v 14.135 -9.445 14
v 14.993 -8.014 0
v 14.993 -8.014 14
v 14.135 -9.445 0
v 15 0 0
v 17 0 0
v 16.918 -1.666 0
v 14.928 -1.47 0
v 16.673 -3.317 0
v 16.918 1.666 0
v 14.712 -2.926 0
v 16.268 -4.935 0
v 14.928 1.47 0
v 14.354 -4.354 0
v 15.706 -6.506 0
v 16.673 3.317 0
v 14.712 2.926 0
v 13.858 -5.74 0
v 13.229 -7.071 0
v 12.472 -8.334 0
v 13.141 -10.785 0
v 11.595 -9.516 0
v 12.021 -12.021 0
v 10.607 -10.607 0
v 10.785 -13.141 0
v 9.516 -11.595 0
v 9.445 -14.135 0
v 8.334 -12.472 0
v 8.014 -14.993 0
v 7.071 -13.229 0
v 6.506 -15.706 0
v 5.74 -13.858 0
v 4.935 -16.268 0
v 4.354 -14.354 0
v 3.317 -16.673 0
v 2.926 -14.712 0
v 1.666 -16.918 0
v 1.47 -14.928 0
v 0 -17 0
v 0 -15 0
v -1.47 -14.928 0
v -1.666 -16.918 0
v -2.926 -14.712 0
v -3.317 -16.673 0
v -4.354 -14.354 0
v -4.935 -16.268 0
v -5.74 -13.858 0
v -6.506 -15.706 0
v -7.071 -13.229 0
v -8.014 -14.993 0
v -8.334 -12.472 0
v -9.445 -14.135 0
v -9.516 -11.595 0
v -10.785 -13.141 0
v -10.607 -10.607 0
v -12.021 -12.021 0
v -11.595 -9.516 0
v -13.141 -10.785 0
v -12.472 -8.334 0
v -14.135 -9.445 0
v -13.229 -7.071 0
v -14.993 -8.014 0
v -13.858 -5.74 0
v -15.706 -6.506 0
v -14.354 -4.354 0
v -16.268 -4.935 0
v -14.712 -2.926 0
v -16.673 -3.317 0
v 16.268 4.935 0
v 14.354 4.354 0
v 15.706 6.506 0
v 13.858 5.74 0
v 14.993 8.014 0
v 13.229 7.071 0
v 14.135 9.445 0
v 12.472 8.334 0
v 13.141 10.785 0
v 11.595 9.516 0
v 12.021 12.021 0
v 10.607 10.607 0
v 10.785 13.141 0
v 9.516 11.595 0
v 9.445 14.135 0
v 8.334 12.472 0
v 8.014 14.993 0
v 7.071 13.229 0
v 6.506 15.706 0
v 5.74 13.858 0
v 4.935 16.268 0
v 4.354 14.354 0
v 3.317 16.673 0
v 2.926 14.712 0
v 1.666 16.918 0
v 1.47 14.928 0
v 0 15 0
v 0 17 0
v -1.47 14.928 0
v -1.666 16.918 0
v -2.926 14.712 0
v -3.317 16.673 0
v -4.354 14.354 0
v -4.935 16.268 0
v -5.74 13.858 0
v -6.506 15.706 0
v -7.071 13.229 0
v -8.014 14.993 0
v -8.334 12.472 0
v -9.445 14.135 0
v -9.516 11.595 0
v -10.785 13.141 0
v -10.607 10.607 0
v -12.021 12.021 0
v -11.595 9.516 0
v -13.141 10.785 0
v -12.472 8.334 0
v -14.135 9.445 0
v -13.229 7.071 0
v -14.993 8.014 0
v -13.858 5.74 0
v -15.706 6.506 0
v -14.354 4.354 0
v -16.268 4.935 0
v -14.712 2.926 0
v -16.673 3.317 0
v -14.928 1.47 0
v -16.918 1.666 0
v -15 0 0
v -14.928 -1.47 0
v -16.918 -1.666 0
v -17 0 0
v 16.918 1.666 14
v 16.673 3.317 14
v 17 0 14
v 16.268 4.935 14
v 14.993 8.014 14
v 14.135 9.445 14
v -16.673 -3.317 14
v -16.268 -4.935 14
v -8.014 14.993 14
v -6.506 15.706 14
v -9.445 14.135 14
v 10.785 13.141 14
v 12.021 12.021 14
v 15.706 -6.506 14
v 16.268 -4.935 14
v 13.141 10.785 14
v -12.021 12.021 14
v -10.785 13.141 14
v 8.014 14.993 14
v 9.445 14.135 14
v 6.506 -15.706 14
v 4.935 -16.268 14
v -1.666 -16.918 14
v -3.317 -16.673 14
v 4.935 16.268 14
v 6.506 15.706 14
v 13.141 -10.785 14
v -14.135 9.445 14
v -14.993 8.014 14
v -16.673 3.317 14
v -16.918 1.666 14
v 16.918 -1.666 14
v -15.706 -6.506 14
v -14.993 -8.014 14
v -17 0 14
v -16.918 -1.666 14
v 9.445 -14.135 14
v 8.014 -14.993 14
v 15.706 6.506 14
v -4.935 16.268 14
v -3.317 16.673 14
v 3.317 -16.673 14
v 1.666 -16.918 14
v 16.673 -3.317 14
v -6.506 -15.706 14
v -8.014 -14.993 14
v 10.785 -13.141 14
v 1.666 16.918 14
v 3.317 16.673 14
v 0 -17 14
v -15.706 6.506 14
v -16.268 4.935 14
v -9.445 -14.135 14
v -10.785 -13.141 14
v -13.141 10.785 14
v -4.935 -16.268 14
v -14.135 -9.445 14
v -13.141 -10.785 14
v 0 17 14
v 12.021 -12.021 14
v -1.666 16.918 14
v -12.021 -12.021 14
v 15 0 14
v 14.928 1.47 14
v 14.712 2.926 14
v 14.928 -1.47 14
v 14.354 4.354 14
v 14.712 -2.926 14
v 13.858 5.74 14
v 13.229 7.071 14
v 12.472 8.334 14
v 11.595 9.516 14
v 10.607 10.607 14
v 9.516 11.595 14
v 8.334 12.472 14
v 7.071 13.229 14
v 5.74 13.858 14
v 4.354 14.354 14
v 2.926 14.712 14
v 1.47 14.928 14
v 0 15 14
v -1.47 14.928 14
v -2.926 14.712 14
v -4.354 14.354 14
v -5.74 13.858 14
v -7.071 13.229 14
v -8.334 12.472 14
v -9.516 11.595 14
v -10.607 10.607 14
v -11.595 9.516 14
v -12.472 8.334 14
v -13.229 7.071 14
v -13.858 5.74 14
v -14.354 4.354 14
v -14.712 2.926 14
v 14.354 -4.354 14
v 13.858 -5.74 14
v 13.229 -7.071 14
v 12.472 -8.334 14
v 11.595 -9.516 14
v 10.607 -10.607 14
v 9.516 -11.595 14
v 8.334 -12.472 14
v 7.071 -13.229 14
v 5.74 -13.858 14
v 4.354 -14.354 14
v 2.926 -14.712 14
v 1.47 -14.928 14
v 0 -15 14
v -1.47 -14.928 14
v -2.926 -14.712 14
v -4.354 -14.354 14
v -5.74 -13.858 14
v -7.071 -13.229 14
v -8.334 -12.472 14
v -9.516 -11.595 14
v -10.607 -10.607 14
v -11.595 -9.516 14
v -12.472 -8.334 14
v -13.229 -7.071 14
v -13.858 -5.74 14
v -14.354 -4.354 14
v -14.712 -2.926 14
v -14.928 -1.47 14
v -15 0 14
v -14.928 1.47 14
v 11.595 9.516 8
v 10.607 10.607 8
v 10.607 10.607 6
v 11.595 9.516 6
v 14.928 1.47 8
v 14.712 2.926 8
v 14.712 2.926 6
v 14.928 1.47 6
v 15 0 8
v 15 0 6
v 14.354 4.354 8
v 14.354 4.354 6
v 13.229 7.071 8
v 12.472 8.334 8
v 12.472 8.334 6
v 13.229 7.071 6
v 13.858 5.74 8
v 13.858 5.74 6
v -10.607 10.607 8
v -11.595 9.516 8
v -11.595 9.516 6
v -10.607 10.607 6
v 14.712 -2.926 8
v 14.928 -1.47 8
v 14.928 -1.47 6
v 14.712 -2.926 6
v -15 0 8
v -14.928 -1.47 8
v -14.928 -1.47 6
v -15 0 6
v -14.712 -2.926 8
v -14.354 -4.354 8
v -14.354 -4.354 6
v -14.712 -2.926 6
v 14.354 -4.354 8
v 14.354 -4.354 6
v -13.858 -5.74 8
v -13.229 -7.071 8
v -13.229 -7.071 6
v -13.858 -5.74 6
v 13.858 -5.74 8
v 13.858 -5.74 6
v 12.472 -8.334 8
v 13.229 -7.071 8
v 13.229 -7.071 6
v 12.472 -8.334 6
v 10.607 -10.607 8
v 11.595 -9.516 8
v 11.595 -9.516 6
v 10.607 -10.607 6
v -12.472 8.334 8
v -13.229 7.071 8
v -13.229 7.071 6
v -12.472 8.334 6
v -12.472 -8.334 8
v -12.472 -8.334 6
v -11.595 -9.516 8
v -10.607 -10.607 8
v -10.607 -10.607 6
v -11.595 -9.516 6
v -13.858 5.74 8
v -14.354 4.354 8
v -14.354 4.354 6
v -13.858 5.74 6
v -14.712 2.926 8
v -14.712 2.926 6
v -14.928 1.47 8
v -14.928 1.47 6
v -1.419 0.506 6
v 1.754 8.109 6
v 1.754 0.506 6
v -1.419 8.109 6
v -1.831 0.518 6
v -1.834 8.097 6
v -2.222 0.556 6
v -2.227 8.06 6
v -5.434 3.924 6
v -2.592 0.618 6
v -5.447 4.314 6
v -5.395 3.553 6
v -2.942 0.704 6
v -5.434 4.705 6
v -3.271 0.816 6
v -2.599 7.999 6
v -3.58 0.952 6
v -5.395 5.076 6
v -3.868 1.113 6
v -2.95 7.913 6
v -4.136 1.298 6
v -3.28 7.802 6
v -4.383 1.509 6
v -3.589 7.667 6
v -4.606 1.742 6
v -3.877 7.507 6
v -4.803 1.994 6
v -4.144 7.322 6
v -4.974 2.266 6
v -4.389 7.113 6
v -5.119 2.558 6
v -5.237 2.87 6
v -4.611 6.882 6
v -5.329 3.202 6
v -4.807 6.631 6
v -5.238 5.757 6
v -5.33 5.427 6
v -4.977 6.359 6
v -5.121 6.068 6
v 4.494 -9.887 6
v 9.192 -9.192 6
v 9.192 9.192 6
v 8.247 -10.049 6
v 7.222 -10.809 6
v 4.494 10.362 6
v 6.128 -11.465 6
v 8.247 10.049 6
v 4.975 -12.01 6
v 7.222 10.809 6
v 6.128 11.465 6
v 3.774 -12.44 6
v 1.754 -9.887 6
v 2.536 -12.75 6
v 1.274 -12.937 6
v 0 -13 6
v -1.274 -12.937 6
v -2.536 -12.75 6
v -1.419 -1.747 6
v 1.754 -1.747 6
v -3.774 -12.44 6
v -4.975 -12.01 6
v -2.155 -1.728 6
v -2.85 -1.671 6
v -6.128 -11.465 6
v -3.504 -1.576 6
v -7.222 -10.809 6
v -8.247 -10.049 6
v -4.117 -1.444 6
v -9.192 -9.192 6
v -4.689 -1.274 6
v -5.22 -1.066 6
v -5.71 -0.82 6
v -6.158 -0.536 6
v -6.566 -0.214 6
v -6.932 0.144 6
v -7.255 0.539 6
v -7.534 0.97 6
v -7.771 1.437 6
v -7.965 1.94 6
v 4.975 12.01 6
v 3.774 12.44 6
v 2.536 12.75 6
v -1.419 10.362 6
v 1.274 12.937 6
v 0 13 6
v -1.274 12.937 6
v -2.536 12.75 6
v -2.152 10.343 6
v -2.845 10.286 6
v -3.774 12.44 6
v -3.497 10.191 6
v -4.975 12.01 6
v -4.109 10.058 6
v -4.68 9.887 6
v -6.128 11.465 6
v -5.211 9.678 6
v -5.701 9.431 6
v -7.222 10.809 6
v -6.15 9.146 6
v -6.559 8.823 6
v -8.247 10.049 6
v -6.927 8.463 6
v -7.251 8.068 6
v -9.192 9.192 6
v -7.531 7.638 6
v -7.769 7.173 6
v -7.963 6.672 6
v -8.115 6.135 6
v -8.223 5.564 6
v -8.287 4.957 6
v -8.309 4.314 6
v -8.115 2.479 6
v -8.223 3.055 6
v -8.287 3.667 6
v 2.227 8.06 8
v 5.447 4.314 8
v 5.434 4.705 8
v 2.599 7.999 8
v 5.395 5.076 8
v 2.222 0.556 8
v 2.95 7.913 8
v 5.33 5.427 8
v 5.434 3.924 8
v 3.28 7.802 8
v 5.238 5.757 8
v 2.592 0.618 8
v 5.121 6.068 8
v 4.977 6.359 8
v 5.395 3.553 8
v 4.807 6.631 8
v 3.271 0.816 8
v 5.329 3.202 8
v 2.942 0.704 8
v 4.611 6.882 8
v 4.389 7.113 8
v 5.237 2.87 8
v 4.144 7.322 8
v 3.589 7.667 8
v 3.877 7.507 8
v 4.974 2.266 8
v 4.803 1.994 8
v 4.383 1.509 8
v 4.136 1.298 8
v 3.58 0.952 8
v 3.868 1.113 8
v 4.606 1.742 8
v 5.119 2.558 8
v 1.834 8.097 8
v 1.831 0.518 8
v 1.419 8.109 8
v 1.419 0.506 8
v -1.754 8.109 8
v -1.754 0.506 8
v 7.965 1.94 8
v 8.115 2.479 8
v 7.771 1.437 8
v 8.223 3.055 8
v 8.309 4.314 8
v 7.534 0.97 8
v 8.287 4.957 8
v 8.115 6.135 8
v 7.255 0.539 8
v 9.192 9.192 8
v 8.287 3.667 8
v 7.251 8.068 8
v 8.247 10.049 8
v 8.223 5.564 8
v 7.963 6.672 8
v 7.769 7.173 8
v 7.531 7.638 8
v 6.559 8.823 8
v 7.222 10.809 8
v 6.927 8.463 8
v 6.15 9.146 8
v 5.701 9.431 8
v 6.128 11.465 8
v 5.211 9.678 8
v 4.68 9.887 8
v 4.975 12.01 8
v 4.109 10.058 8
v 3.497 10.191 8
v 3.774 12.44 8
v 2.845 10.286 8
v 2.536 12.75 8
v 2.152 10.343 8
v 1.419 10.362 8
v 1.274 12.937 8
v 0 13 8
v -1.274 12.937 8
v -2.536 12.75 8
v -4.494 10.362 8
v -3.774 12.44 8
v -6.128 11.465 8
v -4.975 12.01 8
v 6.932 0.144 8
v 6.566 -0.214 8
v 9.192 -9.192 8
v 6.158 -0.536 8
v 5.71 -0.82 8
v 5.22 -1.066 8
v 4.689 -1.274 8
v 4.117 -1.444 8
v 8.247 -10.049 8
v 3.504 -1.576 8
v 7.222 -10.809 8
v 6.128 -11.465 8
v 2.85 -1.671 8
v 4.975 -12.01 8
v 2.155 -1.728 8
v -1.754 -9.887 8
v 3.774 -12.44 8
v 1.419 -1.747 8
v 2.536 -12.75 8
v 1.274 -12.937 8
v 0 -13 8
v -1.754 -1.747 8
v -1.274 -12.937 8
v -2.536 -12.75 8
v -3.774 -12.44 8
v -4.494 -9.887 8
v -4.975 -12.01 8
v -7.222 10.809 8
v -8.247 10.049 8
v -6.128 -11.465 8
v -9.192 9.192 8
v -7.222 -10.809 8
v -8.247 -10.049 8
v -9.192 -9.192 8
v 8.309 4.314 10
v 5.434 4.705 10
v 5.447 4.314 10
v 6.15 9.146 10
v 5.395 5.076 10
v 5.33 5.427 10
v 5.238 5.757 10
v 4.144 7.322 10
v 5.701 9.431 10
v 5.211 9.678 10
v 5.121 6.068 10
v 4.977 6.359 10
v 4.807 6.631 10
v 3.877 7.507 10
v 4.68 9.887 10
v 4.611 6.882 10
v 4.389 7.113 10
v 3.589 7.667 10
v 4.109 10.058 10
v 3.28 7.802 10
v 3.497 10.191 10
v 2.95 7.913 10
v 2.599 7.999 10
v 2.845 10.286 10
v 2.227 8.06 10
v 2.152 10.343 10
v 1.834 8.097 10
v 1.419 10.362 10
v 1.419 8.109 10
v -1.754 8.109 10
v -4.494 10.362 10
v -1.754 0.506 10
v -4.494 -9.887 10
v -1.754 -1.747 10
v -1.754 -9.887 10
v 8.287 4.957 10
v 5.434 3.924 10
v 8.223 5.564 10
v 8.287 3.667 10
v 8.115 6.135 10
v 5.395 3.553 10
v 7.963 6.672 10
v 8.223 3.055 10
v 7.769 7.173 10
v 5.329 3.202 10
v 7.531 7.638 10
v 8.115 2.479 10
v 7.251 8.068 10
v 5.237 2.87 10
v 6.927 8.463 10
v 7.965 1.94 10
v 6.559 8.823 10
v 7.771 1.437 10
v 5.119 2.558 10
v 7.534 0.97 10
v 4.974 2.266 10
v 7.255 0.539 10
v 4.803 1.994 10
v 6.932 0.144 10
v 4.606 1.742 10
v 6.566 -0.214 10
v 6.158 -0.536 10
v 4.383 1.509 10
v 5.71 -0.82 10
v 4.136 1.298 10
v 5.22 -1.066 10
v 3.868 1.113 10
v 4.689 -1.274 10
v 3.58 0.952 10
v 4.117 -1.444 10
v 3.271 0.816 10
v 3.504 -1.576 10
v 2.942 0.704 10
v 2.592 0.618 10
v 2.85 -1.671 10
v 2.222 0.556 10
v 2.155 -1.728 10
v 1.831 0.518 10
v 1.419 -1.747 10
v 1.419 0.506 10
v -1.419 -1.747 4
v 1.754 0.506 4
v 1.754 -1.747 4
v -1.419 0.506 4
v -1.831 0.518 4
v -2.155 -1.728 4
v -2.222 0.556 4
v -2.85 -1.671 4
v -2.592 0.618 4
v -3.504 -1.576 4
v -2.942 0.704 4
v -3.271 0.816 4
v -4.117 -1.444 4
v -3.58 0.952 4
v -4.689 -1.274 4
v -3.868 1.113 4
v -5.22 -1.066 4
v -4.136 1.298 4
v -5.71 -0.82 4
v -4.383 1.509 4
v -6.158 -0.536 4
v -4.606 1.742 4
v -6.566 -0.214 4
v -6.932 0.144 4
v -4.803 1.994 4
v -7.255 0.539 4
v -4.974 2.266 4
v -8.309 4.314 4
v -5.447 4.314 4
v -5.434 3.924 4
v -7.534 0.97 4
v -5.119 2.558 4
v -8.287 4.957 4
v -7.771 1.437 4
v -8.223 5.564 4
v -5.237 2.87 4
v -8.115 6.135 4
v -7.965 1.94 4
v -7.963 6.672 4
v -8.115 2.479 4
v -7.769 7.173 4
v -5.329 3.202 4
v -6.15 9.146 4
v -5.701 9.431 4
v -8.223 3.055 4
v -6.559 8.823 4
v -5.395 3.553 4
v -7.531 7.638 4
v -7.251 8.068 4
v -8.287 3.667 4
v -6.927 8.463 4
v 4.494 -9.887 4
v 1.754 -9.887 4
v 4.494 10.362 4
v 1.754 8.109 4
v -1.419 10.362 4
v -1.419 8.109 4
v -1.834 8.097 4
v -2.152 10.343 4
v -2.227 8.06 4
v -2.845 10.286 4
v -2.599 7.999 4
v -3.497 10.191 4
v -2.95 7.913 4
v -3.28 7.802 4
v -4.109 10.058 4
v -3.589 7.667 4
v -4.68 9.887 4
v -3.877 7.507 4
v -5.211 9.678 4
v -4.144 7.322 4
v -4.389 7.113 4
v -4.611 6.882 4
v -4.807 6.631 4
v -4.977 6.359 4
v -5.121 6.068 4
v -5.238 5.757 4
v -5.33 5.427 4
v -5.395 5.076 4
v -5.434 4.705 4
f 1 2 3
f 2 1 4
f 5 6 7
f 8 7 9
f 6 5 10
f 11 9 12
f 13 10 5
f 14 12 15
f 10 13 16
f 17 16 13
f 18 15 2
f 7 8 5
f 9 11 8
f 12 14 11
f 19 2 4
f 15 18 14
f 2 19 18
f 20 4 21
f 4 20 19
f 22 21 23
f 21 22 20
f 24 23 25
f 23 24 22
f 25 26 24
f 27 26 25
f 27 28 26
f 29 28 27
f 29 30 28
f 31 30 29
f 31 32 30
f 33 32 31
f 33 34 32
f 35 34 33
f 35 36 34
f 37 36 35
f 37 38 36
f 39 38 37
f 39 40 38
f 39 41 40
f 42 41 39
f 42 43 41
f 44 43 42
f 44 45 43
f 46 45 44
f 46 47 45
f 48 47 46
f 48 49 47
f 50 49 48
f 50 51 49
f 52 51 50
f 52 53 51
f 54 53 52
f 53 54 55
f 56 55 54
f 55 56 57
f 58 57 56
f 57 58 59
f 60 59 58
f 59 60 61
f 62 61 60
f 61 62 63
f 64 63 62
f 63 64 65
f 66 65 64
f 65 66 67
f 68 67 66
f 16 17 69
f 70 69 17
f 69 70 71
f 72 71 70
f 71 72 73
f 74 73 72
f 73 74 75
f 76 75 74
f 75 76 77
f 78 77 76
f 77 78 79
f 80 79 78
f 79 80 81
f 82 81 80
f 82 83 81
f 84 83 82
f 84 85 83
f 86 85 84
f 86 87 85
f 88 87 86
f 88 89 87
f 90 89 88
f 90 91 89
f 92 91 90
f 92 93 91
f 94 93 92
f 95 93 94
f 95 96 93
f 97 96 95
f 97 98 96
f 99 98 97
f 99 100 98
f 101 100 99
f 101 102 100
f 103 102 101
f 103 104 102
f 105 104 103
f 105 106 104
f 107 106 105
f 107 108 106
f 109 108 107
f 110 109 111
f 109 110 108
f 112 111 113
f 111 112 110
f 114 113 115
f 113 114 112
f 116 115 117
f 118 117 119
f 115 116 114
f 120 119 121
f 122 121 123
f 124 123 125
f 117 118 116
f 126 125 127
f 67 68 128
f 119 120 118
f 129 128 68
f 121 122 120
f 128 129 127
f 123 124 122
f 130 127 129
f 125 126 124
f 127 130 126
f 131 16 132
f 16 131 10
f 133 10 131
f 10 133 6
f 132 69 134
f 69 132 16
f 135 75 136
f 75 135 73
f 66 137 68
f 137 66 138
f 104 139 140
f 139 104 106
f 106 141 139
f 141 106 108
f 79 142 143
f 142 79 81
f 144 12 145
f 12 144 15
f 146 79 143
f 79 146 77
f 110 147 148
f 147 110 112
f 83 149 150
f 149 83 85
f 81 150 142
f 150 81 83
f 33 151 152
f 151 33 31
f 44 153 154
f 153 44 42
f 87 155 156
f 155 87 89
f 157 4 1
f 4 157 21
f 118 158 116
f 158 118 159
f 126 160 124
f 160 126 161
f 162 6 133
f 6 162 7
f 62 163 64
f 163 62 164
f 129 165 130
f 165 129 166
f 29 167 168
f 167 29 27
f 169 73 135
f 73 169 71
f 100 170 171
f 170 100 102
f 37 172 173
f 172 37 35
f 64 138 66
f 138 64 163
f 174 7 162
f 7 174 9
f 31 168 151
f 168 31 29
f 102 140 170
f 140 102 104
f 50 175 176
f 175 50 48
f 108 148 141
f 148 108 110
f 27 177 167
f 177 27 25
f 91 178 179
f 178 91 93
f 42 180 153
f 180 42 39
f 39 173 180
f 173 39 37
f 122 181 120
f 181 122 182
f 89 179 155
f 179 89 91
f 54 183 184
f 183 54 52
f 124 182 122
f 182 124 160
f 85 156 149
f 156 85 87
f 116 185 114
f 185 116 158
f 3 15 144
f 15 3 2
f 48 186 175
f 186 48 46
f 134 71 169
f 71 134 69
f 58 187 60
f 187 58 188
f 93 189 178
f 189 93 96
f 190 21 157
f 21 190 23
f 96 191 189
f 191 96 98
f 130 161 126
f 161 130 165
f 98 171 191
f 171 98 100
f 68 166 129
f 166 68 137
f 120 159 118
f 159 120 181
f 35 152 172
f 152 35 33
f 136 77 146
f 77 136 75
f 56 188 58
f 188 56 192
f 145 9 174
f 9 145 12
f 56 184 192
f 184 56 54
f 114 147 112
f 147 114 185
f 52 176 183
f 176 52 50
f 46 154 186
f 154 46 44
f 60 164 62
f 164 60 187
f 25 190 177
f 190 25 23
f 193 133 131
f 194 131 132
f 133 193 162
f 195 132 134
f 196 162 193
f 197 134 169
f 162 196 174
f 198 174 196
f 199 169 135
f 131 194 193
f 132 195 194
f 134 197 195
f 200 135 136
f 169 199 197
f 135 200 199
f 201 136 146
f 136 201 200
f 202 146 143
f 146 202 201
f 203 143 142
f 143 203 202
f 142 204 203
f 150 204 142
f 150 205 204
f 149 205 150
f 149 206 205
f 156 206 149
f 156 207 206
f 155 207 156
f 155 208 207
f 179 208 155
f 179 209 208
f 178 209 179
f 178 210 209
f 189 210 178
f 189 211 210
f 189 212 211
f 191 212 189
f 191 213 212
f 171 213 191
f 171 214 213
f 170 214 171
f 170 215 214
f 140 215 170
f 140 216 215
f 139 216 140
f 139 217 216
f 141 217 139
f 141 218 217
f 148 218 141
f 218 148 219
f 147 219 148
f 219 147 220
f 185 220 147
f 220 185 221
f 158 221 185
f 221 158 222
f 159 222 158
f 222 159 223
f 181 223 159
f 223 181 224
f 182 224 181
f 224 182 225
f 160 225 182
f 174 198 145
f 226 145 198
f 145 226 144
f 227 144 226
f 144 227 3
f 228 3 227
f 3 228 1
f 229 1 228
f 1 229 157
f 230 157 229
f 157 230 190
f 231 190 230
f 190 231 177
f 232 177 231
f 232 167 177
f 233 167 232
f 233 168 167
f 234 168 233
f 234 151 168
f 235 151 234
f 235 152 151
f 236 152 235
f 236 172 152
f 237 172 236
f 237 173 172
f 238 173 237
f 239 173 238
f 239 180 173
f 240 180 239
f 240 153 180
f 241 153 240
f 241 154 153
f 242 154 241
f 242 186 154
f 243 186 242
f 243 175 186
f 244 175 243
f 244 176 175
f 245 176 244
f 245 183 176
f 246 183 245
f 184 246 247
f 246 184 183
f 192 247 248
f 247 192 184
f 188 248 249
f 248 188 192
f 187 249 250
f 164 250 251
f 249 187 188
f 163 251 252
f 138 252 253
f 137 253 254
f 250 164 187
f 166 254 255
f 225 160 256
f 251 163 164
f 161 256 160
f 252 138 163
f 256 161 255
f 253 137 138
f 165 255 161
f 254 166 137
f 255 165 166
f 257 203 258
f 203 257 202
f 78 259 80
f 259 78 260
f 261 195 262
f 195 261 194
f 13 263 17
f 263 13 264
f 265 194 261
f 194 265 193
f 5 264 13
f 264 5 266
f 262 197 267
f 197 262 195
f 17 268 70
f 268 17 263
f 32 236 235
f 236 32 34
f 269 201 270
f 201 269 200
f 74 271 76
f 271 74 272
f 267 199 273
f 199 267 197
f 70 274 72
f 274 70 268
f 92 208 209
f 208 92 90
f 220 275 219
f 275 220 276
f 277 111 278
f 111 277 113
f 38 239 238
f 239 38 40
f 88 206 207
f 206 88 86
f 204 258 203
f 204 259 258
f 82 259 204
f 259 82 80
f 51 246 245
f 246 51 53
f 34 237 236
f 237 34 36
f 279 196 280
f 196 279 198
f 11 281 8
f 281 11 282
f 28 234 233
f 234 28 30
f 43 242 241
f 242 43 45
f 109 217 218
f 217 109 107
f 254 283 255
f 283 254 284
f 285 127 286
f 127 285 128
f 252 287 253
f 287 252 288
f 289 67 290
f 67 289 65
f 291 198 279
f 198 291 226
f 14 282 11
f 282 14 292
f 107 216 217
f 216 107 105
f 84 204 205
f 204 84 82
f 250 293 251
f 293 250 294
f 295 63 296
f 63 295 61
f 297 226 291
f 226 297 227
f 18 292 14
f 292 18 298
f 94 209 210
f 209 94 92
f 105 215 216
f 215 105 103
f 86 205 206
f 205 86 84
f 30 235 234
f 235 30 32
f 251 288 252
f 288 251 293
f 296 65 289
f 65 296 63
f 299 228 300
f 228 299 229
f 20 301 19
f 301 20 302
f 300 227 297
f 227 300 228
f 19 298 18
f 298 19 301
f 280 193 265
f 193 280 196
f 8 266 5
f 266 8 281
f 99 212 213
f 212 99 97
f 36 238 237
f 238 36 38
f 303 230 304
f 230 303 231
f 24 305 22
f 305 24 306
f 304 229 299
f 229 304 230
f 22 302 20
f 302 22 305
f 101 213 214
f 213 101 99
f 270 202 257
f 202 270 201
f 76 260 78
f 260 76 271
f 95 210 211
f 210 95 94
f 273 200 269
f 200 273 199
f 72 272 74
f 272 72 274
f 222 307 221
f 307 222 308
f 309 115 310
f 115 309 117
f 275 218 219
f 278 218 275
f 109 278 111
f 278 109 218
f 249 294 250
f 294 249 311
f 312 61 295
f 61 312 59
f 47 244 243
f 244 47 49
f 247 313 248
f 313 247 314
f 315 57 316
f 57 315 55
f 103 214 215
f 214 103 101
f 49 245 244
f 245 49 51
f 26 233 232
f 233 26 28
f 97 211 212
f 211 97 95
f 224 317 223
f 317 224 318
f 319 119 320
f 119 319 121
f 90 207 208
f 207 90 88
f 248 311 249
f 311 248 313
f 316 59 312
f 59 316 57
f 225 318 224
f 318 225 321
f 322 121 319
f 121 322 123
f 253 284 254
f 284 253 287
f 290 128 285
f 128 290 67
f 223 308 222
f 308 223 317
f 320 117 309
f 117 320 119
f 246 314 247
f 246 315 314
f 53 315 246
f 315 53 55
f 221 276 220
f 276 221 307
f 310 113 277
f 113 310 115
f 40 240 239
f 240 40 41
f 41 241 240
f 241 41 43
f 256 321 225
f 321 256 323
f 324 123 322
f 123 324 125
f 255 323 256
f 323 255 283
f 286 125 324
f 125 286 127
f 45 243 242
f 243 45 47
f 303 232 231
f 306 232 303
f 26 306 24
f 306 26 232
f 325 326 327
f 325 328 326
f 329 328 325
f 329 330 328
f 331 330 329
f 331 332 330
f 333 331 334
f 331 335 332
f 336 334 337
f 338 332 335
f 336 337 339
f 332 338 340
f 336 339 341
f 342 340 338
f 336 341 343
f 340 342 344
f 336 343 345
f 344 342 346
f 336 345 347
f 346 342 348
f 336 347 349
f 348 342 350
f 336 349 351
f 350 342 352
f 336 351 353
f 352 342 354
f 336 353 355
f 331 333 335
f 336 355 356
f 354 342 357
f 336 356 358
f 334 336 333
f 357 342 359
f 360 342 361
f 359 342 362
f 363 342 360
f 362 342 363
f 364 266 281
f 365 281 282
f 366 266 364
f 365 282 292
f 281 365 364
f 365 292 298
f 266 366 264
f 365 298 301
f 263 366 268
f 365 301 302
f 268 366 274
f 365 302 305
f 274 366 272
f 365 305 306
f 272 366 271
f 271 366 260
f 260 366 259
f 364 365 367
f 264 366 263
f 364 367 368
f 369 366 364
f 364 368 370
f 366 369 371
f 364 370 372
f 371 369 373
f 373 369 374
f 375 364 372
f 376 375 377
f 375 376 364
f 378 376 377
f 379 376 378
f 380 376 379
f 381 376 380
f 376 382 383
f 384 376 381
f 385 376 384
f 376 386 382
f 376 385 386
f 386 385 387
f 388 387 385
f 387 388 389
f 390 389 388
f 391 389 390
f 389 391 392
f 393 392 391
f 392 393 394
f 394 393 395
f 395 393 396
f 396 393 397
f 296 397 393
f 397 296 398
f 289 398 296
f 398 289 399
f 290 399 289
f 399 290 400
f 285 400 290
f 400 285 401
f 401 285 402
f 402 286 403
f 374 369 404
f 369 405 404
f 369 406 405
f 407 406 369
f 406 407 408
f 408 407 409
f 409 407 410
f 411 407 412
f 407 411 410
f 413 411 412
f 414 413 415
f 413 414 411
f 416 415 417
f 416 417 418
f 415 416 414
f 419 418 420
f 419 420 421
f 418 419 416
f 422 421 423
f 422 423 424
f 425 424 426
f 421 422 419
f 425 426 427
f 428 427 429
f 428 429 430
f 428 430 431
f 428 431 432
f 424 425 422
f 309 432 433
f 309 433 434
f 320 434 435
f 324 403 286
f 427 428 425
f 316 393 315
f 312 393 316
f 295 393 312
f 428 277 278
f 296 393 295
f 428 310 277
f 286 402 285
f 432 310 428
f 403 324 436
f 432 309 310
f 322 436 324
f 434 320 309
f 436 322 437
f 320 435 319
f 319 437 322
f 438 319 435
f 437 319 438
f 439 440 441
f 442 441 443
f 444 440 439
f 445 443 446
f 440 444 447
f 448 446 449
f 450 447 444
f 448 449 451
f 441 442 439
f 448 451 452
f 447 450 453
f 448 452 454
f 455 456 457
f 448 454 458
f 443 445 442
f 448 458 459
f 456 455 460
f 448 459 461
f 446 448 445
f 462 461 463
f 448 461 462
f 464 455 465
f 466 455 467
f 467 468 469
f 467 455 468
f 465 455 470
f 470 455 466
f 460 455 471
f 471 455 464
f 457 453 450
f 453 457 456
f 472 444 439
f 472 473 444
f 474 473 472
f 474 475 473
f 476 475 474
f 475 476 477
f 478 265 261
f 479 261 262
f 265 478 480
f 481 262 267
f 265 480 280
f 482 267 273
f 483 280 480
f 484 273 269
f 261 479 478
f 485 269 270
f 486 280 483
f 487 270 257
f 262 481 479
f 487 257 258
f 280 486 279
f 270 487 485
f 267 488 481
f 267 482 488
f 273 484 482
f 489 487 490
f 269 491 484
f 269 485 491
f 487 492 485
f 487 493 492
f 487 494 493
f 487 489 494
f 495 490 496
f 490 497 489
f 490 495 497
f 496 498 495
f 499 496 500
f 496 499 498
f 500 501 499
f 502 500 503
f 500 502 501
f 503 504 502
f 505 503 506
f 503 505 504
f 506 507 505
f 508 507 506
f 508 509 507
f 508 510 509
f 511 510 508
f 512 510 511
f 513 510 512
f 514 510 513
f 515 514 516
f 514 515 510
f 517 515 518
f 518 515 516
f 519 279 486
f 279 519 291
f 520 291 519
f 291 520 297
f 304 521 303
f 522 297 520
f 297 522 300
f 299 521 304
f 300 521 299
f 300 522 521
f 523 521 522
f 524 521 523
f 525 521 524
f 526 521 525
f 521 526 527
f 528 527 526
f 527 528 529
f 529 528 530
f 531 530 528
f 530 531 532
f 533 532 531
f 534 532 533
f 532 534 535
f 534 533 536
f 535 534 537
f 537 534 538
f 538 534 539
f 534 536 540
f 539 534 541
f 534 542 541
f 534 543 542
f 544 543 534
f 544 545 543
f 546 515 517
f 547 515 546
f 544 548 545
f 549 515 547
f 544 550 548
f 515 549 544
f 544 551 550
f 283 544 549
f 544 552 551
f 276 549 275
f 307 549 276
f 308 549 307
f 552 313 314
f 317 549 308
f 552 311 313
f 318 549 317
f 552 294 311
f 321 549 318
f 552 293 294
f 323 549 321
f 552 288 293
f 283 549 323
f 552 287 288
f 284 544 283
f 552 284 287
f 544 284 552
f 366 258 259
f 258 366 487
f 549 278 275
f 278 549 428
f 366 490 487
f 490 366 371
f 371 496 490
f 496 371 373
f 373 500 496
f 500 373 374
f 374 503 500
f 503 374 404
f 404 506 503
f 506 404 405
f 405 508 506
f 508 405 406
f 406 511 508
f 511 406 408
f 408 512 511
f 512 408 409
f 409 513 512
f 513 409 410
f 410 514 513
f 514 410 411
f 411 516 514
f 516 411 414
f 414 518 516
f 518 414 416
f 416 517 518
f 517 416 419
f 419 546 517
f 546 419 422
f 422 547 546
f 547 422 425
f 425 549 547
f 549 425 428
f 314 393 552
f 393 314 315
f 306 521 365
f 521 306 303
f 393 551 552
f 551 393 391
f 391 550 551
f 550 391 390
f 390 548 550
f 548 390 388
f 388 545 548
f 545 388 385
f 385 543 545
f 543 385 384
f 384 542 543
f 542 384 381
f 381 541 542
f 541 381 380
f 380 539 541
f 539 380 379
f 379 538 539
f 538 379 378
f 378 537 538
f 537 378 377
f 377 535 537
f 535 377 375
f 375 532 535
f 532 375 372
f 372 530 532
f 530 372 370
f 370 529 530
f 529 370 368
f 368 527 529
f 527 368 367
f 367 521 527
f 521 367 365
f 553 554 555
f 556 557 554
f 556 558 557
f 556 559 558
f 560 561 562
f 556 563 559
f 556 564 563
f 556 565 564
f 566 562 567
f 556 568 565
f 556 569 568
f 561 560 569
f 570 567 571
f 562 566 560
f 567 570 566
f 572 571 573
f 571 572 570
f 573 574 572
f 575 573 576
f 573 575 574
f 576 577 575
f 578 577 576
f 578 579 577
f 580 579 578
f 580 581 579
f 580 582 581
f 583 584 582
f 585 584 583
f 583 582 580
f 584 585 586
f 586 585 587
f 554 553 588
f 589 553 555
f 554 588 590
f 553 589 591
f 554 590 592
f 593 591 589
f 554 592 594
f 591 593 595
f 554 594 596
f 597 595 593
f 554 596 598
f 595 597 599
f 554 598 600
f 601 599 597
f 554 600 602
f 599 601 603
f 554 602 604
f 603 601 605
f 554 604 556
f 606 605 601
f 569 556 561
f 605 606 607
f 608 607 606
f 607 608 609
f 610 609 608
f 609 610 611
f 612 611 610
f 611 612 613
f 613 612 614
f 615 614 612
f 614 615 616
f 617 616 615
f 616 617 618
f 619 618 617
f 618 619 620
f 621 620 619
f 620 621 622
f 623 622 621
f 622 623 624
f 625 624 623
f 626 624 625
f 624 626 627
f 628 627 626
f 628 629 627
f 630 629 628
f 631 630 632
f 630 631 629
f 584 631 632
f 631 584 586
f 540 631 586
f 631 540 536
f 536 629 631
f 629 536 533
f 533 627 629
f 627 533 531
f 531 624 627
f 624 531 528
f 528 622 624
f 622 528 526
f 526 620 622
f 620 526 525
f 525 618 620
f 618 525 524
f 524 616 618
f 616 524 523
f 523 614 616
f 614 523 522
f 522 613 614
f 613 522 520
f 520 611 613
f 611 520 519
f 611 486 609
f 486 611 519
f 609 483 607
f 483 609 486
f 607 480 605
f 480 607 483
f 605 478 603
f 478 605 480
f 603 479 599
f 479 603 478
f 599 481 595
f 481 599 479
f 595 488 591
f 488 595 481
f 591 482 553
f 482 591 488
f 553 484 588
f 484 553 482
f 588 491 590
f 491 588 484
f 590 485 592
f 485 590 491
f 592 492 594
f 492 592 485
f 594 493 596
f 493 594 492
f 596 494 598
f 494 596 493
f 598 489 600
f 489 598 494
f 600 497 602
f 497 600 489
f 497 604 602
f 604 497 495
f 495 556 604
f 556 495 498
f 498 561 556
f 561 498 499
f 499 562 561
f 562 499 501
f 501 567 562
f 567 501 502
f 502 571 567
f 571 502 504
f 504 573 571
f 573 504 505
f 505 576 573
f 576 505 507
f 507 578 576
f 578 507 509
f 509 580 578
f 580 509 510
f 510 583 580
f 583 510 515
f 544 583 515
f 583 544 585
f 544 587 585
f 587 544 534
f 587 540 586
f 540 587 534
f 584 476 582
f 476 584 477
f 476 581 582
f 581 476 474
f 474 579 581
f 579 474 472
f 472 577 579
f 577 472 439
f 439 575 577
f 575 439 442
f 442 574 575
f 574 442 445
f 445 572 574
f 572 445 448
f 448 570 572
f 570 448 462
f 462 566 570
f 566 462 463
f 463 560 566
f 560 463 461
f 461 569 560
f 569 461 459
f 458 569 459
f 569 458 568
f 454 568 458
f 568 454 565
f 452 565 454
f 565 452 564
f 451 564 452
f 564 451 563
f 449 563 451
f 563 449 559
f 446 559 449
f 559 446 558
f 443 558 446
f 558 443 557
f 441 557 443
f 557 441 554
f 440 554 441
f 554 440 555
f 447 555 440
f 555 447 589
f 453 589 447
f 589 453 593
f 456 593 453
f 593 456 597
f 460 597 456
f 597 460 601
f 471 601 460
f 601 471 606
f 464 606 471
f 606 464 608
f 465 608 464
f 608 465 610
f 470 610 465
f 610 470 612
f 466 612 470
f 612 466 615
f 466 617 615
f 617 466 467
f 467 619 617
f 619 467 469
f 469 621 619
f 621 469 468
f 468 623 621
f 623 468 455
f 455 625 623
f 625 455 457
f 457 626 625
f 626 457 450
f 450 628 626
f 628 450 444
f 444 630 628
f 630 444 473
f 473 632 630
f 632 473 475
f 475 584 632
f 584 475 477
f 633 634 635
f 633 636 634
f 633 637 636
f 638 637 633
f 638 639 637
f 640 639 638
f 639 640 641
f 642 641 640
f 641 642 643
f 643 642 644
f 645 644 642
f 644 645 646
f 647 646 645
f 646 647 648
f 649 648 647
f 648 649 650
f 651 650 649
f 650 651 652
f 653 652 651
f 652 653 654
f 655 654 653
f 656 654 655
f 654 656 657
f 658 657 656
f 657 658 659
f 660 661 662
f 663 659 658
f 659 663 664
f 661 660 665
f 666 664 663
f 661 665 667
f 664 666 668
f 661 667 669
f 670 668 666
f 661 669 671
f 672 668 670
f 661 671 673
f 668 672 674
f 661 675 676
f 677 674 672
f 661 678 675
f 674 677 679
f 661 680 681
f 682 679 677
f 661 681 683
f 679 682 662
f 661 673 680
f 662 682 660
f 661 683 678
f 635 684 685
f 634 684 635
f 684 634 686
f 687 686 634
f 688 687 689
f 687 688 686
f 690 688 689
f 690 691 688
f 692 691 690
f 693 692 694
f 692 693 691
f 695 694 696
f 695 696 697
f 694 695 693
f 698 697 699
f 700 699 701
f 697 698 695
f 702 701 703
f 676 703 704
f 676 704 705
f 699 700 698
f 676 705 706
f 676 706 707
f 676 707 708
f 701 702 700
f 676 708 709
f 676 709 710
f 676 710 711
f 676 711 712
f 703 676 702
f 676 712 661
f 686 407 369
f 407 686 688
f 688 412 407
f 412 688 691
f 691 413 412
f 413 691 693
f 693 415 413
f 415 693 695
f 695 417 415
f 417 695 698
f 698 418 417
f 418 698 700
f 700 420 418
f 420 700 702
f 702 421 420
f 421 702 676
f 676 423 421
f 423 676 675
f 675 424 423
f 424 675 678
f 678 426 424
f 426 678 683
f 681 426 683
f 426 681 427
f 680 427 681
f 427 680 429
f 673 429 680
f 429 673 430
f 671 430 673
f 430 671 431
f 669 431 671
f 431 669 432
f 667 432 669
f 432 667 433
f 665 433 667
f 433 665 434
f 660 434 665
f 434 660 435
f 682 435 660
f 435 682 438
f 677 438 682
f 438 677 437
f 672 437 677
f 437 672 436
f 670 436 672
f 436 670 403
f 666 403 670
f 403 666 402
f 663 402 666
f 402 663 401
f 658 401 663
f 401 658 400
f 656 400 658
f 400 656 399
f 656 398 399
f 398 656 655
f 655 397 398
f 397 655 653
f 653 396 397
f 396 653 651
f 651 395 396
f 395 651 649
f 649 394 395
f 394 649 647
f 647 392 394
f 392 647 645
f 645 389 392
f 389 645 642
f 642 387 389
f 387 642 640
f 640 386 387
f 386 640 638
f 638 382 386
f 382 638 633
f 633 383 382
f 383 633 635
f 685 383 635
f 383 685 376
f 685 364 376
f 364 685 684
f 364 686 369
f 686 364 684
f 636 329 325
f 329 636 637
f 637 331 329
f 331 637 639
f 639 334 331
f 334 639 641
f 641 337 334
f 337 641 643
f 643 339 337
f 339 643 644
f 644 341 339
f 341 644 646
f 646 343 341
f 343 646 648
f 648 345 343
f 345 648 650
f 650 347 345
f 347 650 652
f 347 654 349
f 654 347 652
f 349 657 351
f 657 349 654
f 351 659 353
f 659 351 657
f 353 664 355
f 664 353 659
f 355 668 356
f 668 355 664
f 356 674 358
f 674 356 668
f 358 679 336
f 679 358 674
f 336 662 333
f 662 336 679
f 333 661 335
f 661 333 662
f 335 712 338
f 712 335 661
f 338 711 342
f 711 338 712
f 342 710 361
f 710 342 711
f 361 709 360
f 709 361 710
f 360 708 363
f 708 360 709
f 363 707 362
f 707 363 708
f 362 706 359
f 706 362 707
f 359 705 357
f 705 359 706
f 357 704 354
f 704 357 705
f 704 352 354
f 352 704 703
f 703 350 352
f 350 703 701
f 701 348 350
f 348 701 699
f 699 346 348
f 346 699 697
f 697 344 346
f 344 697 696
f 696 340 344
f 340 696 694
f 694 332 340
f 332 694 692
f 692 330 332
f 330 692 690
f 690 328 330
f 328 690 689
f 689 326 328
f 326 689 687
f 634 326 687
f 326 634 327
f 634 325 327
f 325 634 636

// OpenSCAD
/*
 * Replacement coin for vintage Frisher Price Retro Cash Register
 *
 * URL: https://github.com/rixvet/print3D-OpenSCAD
 * License: CC-BY-SA-4.0 license
 */

// Radius of coin
$radius = 17;

// Diameter of walls
$wall = 2;

// Height of coin
$height = 14;
 

// Text to print on TOP of coin
$top_text = "P";

// Text to print on Bottom of coin
$bottom_text = "P";

// Size of text
$text_size = 20;

/* [Other options] */
$fn = 64;

// Outer shell
difference() {
cylinder(h=$height,r=$radius);
translate([0,0,-1]) cylinder(h=$height+2,r=$radius-$wall);
}

// Inner plate
$middle = ($height-$wall)/2;
translate([0, 0, $middle]) 
difference() {
    cylinder(h=$wall, r=$radius);
    rotate([0,0,45]) translate([0,0,-1]) rotate_extrude(angle=90) translate([$radius-(2*$wall),0,0]) square([$wall,$radius]);
    rotate([0,0,180+45]) translate([0,0,-1]) rotate_extrude(angle=90) translate([$radius-(2*$wall),0,0]) square([$wall,$radius]);
}

// Text decoration
translate([1, 0, $middle+$wall]) linear_extrude(2) text(text=$top_text, size=$text_size, halign="center", valign="center", font="monospace");
translate([-1, 0, $middle-$wall]) linear_extrude(2) rotate([180,0,180]) text(text=$bottom_text, size=$text_size, halign="center", valign="center", font="monospace");
